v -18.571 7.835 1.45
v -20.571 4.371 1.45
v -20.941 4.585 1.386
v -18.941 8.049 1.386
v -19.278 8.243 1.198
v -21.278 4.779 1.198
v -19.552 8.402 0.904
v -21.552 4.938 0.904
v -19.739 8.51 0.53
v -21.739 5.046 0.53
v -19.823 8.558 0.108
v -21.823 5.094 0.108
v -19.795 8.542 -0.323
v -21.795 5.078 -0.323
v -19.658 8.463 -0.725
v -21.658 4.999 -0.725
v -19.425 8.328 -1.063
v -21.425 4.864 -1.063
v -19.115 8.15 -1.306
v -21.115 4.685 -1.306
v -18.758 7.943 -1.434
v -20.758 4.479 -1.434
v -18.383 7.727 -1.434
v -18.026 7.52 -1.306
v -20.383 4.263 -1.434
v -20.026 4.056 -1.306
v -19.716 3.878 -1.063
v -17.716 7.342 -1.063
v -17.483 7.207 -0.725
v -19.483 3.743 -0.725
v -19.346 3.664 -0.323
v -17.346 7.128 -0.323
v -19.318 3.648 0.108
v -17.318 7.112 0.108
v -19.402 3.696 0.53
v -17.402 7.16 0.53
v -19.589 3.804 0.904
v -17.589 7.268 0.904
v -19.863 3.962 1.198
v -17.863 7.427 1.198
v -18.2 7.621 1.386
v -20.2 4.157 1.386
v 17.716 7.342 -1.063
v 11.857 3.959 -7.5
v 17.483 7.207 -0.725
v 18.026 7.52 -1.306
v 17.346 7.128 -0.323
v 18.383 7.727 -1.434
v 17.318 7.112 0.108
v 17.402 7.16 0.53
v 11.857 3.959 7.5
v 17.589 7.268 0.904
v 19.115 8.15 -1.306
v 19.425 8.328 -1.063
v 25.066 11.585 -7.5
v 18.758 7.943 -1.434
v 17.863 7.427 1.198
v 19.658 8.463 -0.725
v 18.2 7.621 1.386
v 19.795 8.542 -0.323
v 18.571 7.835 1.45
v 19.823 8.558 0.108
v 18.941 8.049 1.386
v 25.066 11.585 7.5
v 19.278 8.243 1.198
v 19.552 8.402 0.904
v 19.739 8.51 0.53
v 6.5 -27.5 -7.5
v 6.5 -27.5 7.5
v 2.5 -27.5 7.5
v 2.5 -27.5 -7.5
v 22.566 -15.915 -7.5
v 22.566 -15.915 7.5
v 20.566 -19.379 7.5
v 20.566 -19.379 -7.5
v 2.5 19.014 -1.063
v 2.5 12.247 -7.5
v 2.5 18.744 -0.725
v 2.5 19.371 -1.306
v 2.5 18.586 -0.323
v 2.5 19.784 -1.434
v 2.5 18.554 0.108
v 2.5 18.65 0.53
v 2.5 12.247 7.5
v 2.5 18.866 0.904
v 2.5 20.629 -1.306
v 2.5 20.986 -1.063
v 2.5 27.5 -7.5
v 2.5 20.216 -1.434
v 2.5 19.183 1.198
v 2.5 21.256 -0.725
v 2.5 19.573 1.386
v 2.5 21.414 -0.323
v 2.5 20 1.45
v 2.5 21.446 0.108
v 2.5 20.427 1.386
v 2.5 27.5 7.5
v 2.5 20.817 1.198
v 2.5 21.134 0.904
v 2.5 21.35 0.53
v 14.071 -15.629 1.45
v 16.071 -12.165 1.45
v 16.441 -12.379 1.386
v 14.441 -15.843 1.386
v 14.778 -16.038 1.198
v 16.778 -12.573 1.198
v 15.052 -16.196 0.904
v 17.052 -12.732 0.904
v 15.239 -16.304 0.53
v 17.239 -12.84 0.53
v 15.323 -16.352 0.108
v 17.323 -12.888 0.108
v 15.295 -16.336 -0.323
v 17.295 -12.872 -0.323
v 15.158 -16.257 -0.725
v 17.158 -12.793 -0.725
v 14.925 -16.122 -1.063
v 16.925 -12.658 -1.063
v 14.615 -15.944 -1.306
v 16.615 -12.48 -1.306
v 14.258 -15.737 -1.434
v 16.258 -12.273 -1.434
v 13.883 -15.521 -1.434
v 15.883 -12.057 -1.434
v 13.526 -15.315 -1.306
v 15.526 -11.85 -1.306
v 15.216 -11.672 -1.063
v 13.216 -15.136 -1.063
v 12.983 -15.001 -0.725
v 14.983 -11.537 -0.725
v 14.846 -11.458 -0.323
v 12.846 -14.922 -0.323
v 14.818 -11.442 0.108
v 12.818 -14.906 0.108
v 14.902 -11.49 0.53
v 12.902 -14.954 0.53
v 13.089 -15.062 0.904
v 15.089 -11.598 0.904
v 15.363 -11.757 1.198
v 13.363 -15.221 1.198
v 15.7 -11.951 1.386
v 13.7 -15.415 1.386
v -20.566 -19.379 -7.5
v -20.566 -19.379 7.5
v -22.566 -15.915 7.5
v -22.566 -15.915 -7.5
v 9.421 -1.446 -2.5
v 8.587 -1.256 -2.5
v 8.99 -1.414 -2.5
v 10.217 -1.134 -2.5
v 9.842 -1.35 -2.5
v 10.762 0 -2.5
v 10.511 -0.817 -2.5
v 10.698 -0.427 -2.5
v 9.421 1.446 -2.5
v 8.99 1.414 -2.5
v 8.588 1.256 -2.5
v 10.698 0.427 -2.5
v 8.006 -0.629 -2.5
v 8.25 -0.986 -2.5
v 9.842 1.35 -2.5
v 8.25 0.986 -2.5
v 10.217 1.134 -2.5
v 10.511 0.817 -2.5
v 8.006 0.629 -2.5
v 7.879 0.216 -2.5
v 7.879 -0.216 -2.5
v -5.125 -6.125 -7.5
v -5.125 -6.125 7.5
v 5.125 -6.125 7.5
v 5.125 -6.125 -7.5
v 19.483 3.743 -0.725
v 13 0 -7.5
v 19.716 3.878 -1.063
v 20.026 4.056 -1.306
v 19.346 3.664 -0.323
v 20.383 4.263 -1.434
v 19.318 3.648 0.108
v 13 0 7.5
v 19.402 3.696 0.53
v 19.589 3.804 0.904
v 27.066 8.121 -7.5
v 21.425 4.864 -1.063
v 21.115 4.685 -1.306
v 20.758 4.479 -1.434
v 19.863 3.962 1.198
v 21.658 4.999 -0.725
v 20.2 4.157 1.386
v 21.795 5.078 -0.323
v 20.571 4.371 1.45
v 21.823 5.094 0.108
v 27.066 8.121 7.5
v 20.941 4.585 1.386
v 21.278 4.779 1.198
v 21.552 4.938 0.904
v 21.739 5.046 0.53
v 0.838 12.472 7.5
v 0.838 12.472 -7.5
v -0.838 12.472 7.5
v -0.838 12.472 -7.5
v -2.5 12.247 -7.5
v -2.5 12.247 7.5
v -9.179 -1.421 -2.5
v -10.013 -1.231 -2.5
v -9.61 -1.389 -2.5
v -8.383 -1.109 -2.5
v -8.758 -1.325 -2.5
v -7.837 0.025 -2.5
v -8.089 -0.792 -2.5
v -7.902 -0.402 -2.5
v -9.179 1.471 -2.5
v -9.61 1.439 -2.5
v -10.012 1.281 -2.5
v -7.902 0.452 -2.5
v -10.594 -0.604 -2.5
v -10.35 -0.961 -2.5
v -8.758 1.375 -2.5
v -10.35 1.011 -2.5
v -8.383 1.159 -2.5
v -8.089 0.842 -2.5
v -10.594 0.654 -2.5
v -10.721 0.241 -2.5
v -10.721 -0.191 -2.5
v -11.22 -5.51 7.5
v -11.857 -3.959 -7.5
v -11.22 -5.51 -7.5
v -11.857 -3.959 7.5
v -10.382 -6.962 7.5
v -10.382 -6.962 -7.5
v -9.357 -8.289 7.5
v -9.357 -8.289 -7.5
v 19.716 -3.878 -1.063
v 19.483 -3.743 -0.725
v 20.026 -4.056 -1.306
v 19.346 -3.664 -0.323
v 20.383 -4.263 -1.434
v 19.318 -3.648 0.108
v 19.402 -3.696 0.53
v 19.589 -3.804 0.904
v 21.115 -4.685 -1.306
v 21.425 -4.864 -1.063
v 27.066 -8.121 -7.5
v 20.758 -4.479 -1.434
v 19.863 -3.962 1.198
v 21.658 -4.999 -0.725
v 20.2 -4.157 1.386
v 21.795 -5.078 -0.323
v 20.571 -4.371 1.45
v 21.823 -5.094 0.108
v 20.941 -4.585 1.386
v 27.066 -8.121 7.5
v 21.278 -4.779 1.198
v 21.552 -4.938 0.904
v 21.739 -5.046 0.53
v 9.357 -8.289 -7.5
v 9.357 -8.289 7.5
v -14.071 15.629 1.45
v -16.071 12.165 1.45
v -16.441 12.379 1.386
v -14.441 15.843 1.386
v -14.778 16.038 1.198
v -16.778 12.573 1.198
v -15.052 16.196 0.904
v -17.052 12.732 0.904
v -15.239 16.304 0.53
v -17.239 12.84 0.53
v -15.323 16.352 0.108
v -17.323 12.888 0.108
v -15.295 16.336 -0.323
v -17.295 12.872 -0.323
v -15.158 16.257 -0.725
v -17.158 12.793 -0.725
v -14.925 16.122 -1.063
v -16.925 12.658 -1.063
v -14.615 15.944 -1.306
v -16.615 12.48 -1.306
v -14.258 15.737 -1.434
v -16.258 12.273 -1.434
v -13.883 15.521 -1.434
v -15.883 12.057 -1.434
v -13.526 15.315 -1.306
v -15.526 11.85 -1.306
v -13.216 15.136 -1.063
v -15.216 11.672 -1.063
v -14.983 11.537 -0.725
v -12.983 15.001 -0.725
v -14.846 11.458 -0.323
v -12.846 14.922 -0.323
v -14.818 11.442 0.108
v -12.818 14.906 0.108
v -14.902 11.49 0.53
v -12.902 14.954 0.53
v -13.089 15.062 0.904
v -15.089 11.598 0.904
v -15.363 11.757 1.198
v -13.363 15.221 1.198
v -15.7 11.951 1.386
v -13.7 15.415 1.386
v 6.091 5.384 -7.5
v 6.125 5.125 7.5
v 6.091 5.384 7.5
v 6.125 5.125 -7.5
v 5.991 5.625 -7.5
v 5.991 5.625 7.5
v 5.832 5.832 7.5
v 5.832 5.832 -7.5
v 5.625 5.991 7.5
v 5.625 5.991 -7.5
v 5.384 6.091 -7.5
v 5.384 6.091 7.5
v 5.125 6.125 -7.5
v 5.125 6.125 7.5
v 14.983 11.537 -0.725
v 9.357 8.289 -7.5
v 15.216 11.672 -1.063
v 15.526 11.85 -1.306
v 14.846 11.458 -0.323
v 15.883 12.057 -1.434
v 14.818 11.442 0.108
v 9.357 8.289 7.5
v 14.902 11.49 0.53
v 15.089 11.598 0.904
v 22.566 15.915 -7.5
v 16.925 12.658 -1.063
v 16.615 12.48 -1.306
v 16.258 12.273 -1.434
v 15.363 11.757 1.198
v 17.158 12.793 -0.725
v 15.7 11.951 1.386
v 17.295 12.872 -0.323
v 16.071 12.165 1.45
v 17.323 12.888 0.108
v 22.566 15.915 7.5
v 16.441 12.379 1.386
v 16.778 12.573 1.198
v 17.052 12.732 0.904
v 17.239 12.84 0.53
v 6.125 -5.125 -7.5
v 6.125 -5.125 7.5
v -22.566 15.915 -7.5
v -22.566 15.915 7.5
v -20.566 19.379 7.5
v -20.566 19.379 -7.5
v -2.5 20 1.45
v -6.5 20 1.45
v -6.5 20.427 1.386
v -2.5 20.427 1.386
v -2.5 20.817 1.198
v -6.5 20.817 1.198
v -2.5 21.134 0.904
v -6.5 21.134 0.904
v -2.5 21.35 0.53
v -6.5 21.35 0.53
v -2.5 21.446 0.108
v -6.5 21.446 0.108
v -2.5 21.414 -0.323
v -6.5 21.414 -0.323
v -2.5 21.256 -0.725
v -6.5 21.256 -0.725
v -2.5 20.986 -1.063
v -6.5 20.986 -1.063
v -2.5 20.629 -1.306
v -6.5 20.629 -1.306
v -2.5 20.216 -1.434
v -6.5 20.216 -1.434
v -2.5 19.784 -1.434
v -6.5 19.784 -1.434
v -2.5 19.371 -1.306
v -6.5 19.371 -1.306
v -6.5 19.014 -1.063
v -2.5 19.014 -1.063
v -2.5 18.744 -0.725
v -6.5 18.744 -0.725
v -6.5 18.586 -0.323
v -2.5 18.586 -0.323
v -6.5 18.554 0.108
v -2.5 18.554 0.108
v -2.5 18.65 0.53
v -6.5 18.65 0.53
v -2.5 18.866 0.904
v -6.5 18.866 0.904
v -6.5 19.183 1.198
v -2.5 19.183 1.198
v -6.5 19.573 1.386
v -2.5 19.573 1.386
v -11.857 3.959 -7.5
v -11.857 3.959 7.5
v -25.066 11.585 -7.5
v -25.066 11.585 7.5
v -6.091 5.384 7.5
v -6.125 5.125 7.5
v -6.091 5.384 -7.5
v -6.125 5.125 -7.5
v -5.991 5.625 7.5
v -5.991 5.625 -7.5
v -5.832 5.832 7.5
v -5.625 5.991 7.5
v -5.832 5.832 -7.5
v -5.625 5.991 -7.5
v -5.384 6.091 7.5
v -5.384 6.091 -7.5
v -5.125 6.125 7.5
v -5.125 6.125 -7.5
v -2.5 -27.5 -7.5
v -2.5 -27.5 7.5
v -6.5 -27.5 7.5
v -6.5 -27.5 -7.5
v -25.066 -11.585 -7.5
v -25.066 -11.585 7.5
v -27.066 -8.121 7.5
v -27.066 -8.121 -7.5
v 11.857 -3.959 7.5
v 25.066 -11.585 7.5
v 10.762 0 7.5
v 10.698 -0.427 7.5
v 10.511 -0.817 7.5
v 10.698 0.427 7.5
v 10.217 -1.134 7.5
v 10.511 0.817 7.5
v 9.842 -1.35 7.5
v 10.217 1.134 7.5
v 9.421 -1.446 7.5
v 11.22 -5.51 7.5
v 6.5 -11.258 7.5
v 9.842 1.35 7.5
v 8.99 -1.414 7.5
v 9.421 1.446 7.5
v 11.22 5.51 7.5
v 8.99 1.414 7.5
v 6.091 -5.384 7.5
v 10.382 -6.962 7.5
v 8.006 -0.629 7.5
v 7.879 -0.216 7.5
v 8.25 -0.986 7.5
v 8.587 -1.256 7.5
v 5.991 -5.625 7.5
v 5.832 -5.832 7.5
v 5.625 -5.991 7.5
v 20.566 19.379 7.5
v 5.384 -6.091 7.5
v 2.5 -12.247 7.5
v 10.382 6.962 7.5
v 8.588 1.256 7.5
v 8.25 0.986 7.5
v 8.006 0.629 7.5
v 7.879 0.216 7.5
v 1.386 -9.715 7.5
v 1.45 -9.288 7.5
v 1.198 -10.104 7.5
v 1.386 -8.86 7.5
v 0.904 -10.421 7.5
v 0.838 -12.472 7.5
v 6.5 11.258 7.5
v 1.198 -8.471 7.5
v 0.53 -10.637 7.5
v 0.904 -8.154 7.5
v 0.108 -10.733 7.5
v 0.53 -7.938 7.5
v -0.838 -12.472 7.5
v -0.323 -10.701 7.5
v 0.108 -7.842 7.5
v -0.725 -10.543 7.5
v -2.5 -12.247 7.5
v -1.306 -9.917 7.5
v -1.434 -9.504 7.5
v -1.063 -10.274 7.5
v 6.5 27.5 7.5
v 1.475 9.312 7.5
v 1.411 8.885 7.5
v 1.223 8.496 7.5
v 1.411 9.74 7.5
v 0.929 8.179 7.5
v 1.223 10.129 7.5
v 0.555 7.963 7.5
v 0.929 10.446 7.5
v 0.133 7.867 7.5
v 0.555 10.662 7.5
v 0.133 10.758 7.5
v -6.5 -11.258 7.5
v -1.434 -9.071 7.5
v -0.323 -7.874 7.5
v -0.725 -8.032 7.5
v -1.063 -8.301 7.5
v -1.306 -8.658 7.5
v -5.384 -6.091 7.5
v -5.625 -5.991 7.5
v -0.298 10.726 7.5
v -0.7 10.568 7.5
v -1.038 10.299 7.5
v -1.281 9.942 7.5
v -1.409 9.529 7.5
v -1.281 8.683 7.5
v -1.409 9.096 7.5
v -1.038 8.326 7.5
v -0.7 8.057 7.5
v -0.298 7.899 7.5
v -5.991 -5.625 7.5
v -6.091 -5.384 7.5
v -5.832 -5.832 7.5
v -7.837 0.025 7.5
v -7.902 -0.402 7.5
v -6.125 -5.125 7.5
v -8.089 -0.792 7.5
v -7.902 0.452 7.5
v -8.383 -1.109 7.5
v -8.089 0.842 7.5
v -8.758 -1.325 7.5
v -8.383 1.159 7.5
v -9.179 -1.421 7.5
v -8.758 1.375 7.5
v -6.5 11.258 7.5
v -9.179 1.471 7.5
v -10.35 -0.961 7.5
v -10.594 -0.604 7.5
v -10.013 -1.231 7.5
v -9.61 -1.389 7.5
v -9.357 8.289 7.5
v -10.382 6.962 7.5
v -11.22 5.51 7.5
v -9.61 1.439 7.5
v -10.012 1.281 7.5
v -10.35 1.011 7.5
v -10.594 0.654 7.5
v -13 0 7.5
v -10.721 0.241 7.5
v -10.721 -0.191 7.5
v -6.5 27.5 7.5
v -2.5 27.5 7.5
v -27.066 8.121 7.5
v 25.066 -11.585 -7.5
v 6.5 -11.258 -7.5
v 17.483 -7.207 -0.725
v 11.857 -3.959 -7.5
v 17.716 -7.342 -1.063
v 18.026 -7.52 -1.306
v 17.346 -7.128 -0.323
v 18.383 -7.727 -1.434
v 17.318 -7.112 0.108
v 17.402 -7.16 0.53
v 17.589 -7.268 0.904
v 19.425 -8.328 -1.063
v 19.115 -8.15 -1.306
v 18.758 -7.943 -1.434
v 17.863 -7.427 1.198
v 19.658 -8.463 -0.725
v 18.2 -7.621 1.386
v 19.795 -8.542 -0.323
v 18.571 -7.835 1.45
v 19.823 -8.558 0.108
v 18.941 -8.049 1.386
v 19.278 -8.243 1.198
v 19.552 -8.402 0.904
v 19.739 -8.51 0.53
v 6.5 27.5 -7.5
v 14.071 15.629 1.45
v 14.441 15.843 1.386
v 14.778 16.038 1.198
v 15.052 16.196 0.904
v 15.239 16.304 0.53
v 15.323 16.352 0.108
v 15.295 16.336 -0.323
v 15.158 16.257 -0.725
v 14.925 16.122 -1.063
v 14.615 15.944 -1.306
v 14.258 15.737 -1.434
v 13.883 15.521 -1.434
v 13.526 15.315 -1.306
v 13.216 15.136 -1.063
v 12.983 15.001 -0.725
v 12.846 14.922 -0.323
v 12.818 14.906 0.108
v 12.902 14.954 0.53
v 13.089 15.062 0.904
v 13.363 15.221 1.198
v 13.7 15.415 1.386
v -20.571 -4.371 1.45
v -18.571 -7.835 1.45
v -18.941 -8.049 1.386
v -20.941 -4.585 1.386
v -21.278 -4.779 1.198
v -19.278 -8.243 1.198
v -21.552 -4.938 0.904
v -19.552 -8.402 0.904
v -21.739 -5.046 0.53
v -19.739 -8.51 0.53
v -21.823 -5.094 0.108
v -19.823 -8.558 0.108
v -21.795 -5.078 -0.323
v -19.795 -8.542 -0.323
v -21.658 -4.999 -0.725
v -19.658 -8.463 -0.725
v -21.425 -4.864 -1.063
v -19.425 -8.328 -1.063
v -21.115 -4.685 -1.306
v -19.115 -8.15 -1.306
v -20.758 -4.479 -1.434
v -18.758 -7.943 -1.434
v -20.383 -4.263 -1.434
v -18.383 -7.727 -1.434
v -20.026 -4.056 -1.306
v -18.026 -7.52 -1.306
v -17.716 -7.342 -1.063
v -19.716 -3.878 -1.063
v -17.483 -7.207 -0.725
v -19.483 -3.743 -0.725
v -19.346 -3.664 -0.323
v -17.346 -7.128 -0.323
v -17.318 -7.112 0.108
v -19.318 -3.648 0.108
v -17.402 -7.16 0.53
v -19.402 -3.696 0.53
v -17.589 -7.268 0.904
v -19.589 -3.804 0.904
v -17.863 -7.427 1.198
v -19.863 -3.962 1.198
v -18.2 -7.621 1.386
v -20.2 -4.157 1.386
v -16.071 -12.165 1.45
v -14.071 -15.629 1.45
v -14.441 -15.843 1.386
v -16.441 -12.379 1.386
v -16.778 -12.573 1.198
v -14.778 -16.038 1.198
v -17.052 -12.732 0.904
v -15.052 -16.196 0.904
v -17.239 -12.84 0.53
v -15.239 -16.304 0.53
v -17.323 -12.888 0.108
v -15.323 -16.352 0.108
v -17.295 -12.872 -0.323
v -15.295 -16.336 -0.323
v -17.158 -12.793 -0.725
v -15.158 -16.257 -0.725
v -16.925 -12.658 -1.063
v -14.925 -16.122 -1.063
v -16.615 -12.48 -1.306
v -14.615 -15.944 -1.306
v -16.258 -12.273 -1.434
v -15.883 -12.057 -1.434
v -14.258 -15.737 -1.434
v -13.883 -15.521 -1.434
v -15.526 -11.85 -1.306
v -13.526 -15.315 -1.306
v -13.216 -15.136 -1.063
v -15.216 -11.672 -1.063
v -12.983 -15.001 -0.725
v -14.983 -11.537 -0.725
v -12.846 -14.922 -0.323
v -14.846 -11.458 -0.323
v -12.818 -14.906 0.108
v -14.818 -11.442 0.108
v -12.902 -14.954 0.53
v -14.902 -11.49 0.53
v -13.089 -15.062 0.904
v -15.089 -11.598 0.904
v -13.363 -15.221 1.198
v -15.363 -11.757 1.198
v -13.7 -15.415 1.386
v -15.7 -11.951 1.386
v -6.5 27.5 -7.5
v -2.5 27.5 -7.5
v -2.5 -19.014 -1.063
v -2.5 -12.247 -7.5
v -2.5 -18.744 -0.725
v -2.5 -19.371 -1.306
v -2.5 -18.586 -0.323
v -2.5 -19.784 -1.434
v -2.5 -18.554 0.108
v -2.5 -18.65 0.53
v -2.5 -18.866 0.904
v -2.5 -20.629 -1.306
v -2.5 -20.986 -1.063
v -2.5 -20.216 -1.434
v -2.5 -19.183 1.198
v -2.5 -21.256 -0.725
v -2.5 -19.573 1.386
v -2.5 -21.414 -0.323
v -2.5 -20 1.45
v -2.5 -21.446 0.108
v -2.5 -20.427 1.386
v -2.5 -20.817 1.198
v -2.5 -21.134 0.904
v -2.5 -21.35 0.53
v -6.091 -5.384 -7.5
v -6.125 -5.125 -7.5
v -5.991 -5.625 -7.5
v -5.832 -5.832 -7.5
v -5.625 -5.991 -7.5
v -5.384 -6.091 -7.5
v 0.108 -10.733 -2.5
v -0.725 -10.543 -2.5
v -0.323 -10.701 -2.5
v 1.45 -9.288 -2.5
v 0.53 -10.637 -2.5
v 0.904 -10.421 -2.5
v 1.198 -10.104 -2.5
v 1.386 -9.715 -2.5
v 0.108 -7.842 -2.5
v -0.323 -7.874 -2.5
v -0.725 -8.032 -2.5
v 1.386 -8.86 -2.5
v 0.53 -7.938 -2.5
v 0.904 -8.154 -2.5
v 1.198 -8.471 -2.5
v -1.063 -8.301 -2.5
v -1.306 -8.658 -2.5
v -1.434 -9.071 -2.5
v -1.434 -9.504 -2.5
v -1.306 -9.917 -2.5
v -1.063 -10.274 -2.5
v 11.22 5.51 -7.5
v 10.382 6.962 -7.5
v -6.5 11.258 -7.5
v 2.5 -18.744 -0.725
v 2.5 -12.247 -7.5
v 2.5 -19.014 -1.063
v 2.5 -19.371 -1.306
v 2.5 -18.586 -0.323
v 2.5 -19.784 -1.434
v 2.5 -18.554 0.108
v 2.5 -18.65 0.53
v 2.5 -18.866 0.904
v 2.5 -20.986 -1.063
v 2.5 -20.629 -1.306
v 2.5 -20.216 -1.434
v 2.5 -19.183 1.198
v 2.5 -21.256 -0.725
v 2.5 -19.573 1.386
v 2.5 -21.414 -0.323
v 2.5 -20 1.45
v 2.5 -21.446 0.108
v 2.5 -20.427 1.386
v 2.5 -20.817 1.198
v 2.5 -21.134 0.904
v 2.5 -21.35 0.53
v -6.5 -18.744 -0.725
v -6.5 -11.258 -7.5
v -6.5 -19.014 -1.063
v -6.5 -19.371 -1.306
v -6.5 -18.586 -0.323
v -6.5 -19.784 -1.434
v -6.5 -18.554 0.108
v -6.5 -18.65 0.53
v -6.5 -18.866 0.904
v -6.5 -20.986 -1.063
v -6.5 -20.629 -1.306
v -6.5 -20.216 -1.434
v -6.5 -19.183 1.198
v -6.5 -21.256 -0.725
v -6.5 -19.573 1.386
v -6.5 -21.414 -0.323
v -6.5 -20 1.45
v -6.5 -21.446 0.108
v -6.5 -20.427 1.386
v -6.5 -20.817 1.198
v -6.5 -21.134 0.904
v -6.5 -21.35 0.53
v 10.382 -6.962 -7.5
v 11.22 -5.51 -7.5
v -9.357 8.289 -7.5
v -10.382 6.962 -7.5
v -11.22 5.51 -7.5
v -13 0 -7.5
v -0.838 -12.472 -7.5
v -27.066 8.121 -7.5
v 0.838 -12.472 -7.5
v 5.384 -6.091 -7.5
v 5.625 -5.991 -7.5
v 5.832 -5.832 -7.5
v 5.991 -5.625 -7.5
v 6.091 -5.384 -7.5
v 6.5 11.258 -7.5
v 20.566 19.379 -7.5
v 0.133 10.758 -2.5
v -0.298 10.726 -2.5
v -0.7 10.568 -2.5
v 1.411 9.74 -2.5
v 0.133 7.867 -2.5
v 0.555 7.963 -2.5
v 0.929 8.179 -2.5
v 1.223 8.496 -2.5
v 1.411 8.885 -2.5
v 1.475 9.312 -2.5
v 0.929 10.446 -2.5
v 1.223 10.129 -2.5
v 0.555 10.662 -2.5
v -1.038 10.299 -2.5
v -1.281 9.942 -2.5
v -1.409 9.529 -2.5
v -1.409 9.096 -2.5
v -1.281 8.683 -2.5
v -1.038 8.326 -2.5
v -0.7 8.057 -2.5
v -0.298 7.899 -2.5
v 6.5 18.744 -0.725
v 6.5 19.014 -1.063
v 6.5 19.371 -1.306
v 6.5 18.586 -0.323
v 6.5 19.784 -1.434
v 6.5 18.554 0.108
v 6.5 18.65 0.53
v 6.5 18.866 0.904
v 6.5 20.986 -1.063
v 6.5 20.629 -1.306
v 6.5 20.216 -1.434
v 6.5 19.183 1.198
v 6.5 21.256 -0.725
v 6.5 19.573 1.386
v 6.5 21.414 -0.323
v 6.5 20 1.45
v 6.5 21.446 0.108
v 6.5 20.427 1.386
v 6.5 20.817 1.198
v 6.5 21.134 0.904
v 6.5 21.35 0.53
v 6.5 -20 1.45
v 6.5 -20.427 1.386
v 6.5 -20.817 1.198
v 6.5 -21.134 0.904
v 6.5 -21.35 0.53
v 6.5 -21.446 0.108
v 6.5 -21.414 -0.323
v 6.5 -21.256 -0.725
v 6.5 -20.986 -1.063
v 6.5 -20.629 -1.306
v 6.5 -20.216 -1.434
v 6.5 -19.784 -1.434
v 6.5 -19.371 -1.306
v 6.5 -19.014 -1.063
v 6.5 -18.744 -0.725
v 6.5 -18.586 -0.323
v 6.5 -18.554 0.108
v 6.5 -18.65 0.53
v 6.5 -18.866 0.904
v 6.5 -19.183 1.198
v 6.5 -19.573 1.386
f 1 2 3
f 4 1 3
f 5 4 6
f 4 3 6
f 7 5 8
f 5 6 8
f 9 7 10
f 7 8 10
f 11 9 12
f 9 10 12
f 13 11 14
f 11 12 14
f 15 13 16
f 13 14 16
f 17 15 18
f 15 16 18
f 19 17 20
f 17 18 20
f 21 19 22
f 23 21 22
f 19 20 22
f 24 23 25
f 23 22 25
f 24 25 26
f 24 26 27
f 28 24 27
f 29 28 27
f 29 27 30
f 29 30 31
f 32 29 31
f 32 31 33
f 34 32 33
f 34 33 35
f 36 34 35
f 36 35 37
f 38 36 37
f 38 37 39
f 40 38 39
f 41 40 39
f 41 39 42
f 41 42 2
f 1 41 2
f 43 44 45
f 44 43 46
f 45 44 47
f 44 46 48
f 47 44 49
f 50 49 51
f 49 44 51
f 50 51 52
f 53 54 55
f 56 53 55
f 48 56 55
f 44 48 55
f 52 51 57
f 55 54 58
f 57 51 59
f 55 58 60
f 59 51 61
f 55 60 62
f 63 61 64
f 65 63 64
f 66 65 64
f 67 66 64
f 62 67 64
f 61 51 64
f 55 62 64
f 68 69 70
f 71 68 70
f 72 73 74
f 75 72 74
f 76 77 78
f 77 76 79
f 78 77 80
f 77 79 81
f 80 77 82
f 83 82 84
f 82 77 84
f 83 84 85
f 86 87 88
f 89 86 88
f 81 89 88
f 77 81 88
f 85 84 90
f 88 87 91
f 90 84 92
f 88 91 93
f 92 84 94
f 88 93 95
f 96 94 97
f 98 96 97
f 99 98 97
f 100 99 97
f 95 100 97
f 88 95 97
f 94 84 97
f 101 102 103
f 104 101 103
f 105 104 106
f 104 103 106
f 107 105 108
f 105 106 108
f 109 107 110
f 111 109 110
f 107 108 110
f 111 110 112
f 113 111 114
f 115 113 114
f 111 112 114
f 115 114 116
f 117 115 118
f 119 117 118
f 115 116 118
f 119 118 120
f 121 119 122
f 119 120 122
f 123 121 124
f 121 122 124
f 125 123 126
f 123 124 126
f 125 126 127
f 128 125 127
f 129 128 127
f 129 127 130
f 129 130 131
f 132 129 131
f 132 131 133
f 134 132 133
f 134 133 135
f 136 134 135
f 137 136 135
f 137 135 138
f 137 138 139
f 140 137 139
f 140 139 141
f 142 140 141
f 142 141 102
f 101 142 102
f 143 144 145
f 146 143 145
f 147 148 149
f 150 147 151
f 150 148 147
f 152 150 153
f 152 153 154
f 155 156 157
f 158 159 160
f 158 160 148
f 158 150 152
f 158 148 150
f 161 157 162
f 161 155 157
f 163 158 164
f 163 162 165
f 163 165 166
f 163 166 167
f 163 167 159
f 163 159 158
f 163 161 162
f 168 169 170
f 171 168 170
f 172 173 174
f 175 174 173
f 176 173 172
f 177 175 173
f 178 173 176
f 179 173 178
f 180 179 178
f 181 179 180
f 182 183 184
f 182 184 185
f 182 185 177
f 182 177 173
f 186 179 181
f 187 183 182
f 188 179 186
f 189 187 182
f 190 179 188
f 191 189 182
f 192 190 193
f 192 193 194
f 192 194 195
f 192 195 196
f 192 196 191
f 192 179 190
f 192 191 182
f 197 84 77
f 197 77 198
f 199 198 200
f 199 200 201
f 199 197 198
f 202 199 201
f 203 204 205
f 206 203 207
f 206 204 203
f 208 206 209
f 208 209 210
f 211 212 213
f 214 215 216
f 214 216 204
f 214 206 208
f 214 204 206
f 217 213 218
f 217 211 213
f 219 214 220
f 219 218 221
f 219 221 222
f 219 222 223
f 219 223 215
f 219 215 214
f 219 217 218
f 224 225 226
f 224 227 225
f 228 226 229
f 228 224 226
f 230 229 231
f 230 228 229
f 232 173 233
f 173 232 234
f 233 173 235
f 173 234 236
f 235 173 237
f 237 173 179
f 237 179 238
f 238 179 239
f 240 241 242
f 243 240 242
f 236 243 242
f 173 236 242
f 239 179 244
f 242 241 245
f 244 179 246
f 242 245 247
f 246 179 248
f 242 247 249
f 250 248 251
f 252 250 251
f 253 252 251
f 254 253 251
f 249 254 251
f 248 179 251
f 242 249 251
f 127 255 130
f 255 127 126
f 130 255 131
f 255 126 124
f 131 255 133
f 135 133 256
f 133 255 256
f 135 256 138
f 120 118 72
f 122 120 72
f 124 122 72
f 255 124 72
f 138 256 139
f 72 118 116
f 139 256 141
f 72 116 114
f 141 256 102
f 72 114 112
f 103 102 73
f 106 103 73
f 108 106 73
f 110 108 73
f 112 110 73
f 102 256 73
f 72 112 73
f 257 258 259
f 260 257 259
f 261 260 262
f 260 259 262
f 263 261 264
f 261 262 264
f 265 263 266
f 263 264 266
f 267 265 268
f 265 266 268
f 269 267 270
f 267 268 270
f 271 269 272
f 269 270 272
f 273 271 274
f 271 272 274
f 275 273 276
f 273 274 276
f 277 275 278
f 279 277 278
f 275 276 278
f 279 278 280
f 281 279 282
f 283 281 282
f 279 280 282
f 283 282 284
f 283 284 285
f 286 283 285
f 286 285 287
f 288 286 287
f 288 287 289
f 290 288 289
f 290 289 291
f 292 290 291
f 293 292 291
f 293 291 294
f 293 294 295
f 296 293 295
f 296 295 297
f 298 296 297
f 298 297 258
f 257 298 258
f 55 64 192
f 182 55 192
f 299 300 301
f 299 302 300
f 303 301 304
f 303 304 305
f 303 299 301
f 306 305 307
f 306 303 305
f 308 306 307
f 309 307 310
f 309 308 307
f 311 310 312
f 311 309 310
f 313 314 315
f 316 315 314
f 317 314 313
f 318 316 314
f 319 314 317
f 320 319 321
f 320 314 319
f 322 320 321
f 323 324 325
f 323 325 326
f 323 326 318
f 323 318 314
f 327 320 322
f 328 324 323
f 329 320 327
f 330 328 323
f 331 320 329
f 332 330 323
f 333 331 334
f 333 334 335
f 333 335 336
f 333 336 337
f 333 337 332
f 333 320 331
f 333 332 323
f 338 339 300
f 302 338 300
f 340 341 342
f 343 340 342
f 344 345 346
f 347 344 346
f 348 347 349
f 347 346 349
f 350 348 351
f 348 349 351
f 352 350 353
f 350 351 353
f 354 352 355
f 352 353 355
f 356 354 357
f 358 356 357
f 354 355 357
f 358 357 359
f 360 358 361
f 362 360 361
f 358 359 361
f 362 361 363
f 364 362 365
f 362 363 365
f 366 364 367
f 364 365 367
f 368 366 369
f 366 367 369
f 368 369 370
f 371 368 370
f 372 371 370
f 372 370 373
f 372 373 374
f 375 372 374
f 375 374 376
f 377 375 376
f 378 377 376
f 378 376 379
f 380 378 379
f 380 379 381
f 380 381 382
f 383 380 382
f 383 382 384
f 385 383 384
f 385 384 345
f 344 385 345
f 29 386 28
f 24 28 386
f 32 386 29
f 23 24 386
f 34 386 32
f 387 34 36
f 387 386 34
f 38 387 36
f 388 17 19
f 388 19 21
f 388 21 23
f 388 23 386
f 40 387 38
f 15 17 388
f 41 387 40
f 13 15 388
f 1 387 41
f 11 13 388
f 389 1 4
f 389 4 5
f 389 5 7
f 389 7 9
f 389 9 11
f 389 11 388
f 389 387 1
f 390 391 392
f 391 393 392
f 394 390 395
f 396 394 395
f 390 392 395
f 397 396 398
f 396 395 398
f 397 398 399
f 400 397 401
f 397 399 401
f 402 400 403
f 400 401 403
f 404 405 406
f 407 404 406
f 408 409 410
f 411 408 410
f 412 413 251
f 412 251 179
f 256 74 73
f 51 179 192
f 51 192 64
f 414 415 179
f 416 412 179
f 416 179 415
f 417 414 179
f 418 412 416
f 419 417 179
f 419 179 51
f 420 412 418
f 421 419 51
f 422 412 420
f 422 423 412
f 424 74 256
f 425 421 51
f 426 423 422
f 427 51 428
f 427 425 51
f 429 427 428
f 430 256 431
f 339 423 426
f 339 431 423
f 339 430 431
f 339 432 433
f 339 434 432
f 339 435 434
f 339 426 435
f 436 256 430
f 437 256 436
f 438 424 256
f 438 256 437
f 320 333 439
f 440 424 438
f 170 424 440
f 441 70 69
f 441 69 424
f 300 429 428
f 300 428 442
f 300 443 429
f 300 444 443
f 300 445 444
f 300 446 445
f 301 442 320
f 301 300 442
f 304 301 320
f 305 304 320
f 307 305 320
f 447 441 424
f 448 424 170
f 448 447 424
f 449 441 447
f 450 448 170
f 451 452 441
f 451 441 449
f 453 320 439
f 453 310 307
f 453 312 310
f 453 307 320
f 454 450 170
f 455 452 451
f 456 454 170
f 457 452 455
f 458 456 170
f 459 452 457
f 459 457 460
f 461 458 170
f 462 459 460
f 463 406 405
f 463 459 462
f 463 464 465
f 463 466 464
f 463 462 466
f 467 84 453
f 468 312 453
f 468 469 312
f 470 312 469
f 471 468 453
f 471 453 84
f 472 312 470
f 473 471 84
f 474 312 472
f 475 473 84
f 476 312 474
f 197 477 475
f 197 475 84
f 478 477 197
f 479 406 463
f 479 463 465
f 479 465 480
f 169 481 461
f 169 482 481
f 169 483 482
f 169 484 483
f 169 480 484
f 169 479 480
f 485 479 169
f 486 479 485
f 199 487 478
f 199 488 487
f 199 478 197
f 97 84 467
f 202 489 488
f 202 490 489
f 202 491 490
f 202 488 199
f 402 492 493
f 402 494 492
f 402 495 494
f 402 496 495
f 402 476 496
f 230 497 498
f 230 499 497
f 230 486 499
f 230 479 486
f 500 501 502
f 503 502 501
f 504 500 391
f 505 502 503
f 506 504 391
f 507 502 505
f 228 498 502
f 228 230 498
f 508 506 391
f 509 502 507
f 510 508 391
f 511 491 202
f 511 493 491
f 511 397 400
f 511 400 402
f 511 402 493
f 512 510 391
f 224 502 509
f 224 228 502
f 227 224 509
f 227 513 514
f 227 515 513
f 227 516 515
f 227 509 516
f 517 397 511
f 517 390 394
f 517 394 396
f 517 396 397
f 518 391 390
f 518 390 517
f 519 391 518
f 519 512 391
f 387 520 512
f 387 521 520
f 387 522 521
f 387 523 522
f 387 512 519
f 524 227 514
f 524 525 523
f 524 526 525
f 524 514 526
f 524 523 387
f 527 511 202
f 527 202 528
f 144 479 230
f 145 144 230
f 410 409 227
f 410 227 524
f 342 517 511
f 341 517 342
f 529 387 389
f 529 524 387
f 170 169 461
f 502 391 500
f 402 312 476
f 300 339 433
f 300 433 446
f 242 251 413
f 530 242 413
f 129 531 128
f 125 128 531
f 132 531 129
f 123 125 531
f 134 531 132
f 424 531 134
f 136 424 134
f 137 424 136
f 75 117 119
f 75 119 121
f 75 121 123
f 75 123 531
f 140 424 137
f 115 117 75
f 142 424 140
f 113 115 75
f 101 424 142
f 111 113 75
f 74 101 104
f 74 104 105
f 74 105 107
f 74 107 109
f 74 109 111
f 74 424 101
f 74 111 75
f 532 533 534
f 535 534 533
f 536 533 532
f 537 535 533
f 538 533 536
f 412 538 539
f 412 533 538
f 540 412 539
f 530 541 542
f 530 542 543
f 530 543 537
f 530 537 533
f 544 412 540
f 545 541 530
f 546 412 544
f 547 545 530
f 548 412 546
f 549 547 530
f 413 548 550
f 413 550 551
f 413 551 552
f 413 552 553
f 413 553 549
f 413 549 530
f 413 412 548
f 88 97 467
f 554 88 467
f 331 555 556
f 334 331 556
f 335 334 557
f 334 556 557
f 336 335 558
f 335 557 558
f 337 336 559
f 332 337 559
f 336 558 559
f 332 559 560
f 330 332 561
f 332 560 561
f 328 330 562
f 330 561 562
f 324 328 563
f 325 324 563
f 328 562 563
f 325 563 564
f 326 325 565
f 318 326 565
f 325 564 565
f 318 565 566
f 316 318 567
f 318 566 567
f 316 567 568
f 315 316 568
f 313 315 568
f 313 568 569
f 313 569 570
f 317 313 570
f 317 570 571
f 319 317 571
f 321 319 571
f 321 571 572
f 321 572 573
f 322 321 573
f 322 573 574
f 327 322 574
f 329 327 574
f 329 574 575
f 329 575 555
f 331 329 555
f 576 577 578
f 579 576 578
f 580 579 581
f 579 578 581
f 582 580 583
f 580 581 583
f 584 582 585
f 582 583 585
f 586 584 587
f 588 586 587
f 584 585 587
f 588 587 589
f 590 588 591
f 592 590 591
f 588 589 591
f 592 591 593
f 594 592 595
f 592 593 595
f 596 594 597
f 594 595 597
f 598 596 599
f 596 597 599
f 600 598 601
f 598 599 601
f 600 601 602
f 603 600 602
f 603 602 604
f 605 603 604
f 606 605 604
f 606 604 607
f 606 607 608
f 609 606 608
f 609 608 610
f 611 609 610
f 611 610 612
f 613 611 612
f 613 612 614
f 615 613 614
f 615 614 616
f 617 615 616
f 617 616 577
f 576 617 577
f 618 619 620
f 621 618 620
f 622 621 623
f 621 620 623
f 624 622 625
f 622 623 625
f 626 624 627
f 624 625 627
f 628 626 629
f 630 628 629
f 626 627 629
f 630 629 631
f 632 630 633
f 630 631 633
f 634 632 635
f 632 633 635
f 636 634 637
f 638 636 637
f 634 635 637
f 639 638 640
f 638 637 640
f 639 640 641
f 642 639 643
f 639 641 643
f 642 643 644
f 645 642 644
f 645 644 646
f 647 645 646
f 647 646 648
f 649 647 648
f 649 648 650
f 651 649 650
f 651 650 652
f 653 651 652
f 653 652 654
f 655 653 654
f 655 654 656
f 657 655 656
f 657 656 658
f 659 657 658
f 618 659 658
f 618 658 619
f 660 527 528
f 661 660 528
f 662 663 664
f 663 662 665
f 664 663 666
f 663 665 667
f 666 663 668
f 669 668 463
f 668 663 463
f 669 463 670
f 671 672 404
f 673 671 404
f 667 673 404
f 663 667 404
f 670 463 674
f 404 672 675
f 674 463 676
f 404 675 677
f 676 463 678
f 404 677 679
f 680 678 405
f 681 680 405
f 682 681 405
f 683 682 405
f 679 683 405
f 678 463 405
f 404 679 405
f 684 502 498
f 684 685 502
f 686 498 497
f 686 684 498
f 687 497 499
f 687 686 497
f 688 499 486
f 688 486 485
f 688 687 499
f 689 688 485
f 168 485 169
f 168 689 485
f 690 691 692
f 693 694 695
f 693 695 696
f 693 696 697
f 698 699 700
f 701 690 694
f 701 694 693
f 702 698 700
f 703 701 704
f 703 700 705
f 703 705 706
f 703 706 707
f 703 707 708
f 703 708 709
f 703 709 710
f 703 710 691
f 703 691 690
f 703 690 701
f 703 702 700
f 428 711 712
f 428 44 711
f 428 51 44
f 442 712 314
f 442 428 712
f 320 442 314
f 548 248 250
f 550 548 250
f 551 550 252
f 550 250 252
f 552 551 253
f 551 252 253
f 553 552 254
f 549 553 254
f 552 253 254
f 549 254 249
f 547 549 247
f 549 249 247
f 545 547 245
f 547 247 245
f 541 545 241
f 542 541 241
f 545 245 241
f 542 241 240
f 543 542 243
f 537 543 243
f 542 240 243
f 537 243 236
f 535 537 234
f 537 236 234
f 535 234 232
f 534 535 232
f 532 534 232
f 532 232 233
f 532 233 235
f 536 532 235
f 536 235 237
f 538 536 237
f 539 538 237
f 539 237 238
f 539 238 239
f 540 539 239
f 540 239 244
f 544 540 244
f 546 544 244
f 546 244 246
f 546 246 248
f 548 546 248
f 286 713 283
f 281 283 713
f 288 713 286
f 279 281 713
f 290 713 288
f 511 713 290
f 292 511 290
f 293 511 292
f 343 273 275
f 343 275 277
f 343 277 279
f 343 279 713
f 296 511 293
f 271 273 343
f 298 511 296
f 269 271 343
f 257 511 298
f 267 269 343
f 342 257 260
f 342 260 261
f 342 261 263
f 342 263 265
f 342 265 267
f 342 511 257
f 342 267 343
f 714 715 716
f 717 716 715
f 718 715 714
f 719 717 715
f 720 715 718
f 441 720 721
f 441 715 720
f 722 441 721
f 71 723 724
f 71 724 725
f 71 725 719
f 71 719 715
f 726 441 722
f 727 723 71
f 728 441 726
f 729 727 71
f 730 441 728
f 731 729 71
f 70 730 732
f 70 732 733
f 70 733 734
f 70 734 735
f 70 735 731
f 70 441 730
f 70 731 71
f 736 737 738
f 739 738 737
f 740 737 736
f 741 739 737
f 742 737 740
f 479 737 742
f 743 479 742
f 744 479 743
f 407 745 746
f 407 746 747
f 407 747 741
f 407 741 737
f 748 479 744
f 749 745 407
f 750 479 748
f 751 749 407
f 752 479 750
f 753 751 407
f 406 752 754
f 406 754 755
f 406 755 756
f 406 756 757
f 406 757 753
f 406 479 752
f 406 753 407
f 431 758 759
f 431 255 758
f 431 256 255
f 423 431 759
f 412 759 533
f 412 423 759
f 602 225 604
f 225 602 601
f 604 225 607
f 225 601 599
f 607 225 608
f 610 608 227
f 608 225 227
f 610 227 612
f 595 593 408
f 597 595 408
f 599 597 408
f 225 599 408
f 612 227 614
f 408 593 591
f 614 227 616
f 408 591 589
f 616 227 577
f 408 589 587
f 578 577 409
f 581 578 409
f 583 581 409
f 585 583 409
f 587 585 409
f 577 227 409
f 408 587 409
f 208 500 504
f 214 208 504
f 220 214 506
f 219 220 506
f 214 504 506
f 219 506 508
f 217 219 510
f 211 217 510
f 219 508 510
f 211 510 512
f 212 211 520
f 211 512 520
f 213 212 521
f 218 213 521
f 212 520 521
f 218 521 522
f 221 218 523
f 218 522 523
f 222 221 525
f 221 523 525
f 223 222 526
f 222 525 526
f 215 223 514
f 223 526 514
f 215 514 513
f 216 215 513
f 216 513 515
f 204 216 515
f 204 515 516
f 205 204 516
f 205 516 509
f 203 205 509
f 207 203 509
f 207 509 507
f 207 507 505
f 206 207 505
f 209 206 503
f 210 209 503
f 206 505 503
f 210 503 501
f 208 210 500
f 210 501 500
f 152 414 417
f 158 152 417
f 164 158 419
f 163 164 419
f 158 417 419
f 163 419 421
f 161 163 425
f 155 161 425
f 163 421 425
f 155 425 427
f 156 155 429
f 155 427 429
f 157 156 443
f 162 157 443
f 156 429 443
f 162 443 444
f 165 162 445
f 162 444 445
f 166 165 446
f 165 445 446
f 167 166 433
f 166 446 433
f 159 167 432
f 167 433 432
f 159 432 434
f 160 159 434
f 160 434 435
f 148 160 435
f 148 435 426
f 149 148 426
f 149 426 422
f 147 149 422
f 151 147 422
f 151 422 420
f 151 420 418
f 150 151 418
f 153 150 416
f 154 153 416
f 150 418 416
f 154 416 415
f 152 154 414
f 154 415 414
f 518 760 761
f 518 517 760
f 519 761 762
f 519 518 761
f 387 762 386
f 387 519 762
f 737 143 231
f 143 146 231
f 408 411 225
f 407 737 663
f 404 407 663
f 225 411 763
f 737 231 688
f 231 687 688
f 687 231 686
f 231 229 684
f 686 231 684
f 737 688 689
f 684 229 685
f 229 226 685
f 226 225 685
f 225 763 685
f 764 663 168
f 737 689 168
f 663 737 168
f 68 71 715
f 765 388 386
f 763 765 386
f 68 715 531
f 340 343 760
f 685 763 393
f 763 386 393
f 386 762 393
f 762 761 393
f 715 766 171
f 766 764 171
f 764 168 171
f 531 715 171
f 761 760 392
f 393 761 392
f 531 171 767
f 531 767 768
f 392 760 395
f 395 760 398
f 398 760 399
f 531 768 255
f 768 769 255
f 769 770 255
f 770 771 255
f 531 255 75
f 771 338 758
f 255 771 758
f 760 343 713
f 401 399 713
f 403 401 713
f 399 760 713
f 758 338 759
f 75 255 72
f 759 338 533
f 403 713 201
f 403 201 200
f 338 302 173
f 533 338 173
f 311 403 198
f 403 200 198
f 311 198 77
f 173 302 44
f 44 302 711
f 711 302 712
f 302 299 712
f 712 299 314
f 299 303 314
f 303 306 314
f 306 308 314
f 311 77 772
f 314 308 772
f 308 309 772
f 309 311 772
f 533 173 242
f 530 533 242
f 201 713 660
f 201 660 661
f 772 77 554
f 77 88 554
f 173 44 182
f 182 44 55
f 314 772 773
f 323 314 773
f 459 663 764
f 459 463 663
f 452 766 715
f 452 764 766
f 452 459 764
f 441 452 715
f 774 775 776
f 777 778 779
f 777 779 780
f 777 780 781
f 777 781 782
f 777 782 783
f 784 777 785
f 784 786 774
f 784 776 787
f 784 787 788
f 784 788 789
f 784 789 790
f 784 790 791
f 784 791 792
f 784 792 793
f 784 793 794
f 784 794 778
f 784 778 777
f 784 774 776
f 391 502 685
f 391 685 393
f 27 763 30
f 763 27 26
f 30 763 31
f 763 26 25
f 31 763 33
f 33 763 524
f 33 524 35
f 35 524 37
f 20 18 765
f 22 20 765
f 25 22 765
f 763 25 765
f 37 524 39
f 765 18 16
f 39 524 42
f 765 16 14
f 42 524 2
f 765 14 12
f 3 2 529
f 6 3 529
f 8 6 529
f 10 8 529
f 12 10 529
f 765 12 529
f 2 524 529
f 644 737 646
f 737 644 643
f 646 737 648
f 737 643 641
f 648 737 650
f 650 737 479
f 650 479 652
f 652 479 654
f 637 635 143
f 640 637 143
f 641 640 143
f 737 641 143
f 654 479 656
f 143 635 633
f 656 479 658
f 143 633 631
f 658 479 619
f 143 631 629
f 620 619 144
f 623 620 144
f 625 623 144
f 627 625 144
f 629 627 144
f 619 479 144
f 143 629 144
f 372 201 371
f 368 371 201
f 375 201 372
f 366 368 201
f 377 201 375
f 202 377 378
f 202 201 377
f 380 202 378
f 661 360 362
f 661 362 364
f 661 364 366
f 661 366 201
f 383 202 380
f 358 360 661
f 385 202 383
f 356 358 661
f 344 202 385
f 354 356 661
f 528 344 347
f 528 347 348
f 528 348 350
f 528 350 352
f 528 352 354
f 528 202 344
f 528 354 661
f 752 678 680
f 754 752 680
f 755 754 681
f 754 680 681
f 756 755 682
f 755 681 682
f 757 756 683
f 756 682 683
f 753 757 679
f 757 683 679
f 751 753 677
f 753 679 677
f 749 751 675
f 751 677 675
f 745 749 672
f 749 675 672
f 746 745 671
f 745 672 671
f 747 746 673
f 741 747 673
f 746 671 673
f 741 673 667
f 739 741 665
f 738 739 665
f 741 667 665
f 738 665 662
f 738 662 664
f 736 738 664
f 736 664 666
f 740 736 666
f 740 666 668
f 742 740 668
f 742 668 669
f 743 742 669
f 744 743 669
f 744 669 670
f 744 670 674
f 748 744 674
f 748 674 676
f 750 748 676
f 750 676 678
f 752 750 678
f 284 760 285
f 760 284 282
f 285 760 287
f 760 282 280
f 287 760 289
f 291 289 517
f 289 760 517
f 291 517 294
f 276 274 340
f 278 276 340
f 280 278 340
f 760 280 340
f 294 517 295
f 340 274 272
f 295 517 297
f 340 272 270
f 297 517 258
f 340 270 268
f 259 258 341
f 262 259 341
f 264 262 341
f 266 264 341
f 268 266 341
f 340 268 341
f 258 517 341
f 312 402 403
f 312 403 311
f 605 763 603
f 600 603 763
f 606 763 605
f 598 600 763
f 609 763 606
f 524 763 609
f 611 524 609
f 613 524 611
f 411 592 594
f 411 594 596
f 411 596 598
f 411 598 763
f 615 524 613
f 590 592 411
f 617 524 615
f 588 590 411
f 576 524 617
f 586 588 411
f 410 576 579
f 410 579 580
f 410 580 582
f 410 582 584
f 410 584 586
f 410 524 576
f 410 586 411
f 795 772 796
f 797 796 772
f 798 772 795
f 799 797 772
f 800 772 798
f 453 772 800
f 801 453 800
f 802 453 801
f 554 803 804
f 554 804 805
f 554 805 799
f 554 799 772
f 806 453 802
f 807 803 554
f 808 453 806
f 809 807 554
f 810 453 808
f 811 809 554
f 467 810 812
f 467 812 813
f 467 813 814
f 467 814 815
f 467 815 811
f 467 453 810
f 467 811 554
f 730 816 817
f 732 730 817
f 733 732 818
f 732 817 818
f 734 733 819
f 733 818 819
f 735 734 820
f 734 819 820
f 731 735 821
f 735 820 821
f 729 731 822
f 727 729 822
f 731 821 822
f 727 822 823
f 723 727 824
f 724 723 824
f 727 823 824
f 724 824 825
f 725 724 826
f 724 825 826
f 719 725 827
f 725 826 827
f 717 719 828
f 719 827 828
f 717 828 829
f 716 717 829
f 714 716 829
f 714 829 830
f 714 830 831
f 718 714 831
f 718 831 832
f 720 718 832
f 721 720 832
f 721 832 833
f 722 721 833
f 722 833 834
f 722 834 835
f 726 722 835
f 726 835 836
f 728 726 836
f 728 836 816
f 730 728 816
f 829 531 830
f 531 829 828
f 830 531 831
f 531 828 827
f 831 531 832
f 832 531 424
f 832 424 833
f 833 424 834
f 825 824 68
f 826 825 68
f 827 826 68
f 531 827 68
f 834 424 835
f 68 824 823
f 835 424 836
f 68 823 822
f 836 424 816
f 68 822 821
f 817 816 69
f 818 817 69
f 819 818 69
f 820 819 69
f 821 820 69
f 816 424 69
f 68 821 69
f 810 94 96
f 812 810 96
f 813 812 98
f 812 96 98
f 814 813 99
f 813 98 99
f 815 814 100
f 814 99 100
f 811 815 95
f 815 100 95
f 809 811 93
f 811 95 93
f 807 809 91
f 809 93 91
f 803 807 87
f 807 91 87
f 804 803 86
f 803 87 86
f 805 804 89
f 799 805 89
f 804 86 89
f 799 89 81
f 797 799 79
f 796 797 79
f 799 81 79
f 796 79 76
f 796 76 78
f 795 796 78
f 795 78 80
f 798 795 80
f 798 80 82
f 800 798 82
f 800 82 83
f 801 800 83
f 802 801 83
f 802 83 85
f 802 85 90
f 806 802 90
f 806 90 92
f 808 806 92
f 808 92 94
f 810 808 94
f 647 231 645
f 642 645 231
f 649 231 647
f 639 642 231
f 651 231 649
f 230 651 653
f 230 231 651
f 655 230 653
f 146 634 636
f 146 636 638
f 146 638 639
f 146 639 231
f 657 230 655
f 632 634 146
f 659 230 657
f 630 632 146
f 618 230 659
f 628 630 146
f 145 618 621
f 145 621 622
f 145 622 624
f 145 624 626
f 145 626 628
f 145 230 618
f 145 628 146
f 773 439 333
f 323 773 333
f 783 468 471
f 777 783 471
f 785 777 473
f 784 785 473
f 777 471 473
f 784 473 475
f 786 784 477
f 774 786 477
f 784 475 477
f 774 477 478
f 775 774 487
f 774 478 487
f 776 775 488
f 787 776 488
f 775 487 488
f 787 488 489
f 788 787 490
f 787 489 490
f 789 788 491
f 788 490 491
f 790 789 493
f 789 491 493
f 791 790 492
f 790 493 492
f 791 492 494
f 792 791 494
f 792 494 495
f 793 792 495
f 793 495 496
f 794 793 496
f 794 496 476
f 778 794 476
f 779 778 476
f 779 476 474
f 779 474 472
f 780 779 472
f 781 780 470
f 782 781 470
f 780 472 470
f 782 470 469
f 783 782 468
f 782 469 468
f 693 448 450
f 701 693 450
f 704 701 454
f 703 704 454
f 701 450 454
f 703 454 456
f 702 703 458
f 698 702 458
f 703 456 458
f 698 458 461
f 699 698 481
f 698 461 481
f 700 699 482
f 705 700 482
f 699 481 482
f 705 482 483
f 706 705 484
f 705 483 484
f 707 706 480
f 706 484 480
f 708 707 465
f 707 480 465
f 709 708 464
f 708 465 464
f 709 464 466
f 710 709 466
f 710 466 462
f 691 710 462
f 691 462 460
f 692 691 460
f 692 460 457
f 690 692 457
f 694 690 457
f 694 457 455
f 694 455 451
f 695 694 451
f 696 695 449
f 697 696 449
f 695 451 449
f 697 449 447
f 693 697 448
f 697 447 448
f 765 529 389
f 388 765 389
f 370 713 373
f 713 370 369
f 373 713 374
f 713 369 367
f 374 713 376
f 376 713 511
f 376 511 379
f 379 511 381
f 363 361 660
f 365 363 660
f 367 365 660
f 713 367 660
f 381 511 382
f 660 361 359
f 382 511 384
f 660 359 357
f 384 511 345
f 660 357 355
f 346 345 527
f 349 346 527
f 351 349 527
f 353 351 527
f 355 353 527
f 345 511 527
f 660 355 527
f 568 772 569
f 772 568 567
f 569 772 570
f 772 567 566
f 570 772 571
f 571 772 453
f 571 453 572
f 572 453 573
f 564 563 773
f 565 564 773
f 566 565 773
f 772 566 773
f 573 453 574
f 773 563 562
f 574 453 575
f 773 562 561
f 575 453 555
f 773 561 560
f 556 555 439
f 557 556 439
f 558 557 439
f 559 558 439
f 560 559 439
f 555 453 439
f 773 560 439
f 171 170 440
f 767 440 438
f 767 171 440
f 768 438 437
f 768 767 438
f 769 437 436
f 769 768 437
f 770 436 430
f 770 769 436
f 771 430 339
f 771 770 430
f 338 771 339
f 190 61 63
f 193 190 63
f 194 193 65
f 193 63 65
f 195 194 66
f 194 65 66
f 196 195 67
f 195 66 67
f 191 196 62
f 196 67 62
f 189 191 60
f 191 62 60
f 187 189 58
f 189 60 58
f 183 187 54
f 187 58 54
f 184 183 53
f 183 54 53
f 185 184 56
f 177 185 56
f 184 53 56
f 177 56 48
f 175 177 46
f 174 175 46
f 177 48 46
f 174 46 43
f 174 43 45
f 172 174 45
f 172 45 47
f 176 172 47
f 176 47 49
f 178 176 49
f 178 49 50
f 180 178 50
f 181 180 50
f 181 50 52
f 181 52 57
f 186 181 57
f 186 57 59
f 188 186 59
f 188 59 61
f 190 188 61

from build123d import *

# Parameters (mm, degrees)
SKETCH1_R           = 12.5
BOSS_EXTRUDE1_DEPTH = 7.5
SKETCH4_W           = 4
SKETCH4_H           = 27.5
BOSS_EXTRUDE3_DEPTH = 15
CIRPATTERN7_COUNT   = 6
SKETCH7_R           = 1.45
CUT_EXTRUDE2_DEPTH  = 17
CIRPATTERN9_COUNT   = 6
CUT_EXTRUDE3_REACH  = 43.398
SKETCH8_W           = 12.25
SKETCH8_H           = 12.25
SKETCH9_R           = 1.45
CUT_EXTRUDE4_DEPTH  = 10
FILLET1_R           = 1


with BuildPart() as part:
    # Sketch1 → Boss-Extrude1 (new, symmetric)
    with BuildSketch(Plane.XY):
        Circle(SKETCH1_R)
    extrude(amount=BOSS_EXTRUDE1_DEPTH, both=True)

    # Sketch4 → Boss-Extrude3 (add)
    with BuildSketch(Plane.XY.offset(7.5)):
        with Locations((-4.5, 13.75)):
            Rectangle(SKETCH4_W, SKETCH4_H)
        with Locations((4.5, 13.75)):
            Rectangle(SKETCH4_W, SKETCH4_H)
    boss_extrude3 = extrude(amount=-BOSS_EXTRUDE3_DEPTH)

    # CirPattern7: Boss-Extrude3 ×6 about axis
    cirpattern7_axis = Axis((0, 0, 0), (0, 0, 1))
    for i in range(1, CIRPATTERN7_COUNT):
        add(boss_extrude3.rotate(cirpattern7_axis, i * 360 / CIRPATTERN7_COUNT))

    # Sketch7 → Cut-Extrude2 (cut)
    with BuildSketch(Plane.ZY.offset(6.5)):
        with Locations((0, 20)):
            Circle(SKETCH7_R)
        with Locations((40, 20)):
            Circle(SKETCH7_R)
        with Locations((80, 20)):
            Circle(SKETCH7_R)
        with Locations((120, 20)):
            Circle(SKETCH7_R)
        with Locations((160, 20)):
            Circle(SKETCH7_R)
    cut_extrude2 = extrude(amount=-CUT_EXTRUDE2_DEPTH, mode=Mode.SUBTRACT)

    # CirPattern9: Cut-Extrude2 ×6 about axis
    cirpattern9_axis = Axis((0, 0, 0), (0, 0, 1))
    for i in range(1, CIRPATTERN9_COUNT):
        add(cut_extrude2.rotate(cirpattern9_axis, i * 360 / CIRPATTERN9_COUNT), mode=Mode.SUBTRACT)

    # Sketch8 → Cut-Extrude3 (cut, up to next)
    with BuildSketch(Plane.XY.offset(7.5), mode=Mode.PRIVATE) as cut_extrude3_sk1:
        Rectangle(SKETCH8_W, SKETCH8_H)
    cut_extrude3_tool1 = extrude(cut_extrude3_sk1.sketch, amount=-CUT_EXTRUDE3_REACH, mode=Mode.PRIVATE) & part.part
    add(cut_extrude3_tool1.solids().sort_by_distance((0, 0, 7.5))[0], mode=Mode.SUBTRACT)

    # Sketch9 → Cut-Extrude4 (cut)
    with BuildSketch(Plane.XY.offset(7.5)):
        with Locations((9.3125, 0)):
            Circle(SKETCH9_R)
        with Locations((0, -9.2875)):
            Circle(SKETCH9_R)
        with Locations((-9.2875, 0.025)):
            Circle(SKETCH9_R)
        with Locations((0.025, 9.3125)):
            Circle(SKETCH9_R)
    extrude(amount=-CUT_EXTRUDE4_DEPTH, mode=Mode.SUBTRACT)

    # Fillet1
    fillet1_edges = [part.edges().sort_by_distance(p)[0] for p in [
        (6.125, 6.125, 0),
        (6.125, -6.125, 0),
        (-6.125, -6.125, 0),
        (-6.125, 6.125, 0),
    ]]
    fillet(fillet1_edges, radius=FILLET1_R)


solid = part.part
